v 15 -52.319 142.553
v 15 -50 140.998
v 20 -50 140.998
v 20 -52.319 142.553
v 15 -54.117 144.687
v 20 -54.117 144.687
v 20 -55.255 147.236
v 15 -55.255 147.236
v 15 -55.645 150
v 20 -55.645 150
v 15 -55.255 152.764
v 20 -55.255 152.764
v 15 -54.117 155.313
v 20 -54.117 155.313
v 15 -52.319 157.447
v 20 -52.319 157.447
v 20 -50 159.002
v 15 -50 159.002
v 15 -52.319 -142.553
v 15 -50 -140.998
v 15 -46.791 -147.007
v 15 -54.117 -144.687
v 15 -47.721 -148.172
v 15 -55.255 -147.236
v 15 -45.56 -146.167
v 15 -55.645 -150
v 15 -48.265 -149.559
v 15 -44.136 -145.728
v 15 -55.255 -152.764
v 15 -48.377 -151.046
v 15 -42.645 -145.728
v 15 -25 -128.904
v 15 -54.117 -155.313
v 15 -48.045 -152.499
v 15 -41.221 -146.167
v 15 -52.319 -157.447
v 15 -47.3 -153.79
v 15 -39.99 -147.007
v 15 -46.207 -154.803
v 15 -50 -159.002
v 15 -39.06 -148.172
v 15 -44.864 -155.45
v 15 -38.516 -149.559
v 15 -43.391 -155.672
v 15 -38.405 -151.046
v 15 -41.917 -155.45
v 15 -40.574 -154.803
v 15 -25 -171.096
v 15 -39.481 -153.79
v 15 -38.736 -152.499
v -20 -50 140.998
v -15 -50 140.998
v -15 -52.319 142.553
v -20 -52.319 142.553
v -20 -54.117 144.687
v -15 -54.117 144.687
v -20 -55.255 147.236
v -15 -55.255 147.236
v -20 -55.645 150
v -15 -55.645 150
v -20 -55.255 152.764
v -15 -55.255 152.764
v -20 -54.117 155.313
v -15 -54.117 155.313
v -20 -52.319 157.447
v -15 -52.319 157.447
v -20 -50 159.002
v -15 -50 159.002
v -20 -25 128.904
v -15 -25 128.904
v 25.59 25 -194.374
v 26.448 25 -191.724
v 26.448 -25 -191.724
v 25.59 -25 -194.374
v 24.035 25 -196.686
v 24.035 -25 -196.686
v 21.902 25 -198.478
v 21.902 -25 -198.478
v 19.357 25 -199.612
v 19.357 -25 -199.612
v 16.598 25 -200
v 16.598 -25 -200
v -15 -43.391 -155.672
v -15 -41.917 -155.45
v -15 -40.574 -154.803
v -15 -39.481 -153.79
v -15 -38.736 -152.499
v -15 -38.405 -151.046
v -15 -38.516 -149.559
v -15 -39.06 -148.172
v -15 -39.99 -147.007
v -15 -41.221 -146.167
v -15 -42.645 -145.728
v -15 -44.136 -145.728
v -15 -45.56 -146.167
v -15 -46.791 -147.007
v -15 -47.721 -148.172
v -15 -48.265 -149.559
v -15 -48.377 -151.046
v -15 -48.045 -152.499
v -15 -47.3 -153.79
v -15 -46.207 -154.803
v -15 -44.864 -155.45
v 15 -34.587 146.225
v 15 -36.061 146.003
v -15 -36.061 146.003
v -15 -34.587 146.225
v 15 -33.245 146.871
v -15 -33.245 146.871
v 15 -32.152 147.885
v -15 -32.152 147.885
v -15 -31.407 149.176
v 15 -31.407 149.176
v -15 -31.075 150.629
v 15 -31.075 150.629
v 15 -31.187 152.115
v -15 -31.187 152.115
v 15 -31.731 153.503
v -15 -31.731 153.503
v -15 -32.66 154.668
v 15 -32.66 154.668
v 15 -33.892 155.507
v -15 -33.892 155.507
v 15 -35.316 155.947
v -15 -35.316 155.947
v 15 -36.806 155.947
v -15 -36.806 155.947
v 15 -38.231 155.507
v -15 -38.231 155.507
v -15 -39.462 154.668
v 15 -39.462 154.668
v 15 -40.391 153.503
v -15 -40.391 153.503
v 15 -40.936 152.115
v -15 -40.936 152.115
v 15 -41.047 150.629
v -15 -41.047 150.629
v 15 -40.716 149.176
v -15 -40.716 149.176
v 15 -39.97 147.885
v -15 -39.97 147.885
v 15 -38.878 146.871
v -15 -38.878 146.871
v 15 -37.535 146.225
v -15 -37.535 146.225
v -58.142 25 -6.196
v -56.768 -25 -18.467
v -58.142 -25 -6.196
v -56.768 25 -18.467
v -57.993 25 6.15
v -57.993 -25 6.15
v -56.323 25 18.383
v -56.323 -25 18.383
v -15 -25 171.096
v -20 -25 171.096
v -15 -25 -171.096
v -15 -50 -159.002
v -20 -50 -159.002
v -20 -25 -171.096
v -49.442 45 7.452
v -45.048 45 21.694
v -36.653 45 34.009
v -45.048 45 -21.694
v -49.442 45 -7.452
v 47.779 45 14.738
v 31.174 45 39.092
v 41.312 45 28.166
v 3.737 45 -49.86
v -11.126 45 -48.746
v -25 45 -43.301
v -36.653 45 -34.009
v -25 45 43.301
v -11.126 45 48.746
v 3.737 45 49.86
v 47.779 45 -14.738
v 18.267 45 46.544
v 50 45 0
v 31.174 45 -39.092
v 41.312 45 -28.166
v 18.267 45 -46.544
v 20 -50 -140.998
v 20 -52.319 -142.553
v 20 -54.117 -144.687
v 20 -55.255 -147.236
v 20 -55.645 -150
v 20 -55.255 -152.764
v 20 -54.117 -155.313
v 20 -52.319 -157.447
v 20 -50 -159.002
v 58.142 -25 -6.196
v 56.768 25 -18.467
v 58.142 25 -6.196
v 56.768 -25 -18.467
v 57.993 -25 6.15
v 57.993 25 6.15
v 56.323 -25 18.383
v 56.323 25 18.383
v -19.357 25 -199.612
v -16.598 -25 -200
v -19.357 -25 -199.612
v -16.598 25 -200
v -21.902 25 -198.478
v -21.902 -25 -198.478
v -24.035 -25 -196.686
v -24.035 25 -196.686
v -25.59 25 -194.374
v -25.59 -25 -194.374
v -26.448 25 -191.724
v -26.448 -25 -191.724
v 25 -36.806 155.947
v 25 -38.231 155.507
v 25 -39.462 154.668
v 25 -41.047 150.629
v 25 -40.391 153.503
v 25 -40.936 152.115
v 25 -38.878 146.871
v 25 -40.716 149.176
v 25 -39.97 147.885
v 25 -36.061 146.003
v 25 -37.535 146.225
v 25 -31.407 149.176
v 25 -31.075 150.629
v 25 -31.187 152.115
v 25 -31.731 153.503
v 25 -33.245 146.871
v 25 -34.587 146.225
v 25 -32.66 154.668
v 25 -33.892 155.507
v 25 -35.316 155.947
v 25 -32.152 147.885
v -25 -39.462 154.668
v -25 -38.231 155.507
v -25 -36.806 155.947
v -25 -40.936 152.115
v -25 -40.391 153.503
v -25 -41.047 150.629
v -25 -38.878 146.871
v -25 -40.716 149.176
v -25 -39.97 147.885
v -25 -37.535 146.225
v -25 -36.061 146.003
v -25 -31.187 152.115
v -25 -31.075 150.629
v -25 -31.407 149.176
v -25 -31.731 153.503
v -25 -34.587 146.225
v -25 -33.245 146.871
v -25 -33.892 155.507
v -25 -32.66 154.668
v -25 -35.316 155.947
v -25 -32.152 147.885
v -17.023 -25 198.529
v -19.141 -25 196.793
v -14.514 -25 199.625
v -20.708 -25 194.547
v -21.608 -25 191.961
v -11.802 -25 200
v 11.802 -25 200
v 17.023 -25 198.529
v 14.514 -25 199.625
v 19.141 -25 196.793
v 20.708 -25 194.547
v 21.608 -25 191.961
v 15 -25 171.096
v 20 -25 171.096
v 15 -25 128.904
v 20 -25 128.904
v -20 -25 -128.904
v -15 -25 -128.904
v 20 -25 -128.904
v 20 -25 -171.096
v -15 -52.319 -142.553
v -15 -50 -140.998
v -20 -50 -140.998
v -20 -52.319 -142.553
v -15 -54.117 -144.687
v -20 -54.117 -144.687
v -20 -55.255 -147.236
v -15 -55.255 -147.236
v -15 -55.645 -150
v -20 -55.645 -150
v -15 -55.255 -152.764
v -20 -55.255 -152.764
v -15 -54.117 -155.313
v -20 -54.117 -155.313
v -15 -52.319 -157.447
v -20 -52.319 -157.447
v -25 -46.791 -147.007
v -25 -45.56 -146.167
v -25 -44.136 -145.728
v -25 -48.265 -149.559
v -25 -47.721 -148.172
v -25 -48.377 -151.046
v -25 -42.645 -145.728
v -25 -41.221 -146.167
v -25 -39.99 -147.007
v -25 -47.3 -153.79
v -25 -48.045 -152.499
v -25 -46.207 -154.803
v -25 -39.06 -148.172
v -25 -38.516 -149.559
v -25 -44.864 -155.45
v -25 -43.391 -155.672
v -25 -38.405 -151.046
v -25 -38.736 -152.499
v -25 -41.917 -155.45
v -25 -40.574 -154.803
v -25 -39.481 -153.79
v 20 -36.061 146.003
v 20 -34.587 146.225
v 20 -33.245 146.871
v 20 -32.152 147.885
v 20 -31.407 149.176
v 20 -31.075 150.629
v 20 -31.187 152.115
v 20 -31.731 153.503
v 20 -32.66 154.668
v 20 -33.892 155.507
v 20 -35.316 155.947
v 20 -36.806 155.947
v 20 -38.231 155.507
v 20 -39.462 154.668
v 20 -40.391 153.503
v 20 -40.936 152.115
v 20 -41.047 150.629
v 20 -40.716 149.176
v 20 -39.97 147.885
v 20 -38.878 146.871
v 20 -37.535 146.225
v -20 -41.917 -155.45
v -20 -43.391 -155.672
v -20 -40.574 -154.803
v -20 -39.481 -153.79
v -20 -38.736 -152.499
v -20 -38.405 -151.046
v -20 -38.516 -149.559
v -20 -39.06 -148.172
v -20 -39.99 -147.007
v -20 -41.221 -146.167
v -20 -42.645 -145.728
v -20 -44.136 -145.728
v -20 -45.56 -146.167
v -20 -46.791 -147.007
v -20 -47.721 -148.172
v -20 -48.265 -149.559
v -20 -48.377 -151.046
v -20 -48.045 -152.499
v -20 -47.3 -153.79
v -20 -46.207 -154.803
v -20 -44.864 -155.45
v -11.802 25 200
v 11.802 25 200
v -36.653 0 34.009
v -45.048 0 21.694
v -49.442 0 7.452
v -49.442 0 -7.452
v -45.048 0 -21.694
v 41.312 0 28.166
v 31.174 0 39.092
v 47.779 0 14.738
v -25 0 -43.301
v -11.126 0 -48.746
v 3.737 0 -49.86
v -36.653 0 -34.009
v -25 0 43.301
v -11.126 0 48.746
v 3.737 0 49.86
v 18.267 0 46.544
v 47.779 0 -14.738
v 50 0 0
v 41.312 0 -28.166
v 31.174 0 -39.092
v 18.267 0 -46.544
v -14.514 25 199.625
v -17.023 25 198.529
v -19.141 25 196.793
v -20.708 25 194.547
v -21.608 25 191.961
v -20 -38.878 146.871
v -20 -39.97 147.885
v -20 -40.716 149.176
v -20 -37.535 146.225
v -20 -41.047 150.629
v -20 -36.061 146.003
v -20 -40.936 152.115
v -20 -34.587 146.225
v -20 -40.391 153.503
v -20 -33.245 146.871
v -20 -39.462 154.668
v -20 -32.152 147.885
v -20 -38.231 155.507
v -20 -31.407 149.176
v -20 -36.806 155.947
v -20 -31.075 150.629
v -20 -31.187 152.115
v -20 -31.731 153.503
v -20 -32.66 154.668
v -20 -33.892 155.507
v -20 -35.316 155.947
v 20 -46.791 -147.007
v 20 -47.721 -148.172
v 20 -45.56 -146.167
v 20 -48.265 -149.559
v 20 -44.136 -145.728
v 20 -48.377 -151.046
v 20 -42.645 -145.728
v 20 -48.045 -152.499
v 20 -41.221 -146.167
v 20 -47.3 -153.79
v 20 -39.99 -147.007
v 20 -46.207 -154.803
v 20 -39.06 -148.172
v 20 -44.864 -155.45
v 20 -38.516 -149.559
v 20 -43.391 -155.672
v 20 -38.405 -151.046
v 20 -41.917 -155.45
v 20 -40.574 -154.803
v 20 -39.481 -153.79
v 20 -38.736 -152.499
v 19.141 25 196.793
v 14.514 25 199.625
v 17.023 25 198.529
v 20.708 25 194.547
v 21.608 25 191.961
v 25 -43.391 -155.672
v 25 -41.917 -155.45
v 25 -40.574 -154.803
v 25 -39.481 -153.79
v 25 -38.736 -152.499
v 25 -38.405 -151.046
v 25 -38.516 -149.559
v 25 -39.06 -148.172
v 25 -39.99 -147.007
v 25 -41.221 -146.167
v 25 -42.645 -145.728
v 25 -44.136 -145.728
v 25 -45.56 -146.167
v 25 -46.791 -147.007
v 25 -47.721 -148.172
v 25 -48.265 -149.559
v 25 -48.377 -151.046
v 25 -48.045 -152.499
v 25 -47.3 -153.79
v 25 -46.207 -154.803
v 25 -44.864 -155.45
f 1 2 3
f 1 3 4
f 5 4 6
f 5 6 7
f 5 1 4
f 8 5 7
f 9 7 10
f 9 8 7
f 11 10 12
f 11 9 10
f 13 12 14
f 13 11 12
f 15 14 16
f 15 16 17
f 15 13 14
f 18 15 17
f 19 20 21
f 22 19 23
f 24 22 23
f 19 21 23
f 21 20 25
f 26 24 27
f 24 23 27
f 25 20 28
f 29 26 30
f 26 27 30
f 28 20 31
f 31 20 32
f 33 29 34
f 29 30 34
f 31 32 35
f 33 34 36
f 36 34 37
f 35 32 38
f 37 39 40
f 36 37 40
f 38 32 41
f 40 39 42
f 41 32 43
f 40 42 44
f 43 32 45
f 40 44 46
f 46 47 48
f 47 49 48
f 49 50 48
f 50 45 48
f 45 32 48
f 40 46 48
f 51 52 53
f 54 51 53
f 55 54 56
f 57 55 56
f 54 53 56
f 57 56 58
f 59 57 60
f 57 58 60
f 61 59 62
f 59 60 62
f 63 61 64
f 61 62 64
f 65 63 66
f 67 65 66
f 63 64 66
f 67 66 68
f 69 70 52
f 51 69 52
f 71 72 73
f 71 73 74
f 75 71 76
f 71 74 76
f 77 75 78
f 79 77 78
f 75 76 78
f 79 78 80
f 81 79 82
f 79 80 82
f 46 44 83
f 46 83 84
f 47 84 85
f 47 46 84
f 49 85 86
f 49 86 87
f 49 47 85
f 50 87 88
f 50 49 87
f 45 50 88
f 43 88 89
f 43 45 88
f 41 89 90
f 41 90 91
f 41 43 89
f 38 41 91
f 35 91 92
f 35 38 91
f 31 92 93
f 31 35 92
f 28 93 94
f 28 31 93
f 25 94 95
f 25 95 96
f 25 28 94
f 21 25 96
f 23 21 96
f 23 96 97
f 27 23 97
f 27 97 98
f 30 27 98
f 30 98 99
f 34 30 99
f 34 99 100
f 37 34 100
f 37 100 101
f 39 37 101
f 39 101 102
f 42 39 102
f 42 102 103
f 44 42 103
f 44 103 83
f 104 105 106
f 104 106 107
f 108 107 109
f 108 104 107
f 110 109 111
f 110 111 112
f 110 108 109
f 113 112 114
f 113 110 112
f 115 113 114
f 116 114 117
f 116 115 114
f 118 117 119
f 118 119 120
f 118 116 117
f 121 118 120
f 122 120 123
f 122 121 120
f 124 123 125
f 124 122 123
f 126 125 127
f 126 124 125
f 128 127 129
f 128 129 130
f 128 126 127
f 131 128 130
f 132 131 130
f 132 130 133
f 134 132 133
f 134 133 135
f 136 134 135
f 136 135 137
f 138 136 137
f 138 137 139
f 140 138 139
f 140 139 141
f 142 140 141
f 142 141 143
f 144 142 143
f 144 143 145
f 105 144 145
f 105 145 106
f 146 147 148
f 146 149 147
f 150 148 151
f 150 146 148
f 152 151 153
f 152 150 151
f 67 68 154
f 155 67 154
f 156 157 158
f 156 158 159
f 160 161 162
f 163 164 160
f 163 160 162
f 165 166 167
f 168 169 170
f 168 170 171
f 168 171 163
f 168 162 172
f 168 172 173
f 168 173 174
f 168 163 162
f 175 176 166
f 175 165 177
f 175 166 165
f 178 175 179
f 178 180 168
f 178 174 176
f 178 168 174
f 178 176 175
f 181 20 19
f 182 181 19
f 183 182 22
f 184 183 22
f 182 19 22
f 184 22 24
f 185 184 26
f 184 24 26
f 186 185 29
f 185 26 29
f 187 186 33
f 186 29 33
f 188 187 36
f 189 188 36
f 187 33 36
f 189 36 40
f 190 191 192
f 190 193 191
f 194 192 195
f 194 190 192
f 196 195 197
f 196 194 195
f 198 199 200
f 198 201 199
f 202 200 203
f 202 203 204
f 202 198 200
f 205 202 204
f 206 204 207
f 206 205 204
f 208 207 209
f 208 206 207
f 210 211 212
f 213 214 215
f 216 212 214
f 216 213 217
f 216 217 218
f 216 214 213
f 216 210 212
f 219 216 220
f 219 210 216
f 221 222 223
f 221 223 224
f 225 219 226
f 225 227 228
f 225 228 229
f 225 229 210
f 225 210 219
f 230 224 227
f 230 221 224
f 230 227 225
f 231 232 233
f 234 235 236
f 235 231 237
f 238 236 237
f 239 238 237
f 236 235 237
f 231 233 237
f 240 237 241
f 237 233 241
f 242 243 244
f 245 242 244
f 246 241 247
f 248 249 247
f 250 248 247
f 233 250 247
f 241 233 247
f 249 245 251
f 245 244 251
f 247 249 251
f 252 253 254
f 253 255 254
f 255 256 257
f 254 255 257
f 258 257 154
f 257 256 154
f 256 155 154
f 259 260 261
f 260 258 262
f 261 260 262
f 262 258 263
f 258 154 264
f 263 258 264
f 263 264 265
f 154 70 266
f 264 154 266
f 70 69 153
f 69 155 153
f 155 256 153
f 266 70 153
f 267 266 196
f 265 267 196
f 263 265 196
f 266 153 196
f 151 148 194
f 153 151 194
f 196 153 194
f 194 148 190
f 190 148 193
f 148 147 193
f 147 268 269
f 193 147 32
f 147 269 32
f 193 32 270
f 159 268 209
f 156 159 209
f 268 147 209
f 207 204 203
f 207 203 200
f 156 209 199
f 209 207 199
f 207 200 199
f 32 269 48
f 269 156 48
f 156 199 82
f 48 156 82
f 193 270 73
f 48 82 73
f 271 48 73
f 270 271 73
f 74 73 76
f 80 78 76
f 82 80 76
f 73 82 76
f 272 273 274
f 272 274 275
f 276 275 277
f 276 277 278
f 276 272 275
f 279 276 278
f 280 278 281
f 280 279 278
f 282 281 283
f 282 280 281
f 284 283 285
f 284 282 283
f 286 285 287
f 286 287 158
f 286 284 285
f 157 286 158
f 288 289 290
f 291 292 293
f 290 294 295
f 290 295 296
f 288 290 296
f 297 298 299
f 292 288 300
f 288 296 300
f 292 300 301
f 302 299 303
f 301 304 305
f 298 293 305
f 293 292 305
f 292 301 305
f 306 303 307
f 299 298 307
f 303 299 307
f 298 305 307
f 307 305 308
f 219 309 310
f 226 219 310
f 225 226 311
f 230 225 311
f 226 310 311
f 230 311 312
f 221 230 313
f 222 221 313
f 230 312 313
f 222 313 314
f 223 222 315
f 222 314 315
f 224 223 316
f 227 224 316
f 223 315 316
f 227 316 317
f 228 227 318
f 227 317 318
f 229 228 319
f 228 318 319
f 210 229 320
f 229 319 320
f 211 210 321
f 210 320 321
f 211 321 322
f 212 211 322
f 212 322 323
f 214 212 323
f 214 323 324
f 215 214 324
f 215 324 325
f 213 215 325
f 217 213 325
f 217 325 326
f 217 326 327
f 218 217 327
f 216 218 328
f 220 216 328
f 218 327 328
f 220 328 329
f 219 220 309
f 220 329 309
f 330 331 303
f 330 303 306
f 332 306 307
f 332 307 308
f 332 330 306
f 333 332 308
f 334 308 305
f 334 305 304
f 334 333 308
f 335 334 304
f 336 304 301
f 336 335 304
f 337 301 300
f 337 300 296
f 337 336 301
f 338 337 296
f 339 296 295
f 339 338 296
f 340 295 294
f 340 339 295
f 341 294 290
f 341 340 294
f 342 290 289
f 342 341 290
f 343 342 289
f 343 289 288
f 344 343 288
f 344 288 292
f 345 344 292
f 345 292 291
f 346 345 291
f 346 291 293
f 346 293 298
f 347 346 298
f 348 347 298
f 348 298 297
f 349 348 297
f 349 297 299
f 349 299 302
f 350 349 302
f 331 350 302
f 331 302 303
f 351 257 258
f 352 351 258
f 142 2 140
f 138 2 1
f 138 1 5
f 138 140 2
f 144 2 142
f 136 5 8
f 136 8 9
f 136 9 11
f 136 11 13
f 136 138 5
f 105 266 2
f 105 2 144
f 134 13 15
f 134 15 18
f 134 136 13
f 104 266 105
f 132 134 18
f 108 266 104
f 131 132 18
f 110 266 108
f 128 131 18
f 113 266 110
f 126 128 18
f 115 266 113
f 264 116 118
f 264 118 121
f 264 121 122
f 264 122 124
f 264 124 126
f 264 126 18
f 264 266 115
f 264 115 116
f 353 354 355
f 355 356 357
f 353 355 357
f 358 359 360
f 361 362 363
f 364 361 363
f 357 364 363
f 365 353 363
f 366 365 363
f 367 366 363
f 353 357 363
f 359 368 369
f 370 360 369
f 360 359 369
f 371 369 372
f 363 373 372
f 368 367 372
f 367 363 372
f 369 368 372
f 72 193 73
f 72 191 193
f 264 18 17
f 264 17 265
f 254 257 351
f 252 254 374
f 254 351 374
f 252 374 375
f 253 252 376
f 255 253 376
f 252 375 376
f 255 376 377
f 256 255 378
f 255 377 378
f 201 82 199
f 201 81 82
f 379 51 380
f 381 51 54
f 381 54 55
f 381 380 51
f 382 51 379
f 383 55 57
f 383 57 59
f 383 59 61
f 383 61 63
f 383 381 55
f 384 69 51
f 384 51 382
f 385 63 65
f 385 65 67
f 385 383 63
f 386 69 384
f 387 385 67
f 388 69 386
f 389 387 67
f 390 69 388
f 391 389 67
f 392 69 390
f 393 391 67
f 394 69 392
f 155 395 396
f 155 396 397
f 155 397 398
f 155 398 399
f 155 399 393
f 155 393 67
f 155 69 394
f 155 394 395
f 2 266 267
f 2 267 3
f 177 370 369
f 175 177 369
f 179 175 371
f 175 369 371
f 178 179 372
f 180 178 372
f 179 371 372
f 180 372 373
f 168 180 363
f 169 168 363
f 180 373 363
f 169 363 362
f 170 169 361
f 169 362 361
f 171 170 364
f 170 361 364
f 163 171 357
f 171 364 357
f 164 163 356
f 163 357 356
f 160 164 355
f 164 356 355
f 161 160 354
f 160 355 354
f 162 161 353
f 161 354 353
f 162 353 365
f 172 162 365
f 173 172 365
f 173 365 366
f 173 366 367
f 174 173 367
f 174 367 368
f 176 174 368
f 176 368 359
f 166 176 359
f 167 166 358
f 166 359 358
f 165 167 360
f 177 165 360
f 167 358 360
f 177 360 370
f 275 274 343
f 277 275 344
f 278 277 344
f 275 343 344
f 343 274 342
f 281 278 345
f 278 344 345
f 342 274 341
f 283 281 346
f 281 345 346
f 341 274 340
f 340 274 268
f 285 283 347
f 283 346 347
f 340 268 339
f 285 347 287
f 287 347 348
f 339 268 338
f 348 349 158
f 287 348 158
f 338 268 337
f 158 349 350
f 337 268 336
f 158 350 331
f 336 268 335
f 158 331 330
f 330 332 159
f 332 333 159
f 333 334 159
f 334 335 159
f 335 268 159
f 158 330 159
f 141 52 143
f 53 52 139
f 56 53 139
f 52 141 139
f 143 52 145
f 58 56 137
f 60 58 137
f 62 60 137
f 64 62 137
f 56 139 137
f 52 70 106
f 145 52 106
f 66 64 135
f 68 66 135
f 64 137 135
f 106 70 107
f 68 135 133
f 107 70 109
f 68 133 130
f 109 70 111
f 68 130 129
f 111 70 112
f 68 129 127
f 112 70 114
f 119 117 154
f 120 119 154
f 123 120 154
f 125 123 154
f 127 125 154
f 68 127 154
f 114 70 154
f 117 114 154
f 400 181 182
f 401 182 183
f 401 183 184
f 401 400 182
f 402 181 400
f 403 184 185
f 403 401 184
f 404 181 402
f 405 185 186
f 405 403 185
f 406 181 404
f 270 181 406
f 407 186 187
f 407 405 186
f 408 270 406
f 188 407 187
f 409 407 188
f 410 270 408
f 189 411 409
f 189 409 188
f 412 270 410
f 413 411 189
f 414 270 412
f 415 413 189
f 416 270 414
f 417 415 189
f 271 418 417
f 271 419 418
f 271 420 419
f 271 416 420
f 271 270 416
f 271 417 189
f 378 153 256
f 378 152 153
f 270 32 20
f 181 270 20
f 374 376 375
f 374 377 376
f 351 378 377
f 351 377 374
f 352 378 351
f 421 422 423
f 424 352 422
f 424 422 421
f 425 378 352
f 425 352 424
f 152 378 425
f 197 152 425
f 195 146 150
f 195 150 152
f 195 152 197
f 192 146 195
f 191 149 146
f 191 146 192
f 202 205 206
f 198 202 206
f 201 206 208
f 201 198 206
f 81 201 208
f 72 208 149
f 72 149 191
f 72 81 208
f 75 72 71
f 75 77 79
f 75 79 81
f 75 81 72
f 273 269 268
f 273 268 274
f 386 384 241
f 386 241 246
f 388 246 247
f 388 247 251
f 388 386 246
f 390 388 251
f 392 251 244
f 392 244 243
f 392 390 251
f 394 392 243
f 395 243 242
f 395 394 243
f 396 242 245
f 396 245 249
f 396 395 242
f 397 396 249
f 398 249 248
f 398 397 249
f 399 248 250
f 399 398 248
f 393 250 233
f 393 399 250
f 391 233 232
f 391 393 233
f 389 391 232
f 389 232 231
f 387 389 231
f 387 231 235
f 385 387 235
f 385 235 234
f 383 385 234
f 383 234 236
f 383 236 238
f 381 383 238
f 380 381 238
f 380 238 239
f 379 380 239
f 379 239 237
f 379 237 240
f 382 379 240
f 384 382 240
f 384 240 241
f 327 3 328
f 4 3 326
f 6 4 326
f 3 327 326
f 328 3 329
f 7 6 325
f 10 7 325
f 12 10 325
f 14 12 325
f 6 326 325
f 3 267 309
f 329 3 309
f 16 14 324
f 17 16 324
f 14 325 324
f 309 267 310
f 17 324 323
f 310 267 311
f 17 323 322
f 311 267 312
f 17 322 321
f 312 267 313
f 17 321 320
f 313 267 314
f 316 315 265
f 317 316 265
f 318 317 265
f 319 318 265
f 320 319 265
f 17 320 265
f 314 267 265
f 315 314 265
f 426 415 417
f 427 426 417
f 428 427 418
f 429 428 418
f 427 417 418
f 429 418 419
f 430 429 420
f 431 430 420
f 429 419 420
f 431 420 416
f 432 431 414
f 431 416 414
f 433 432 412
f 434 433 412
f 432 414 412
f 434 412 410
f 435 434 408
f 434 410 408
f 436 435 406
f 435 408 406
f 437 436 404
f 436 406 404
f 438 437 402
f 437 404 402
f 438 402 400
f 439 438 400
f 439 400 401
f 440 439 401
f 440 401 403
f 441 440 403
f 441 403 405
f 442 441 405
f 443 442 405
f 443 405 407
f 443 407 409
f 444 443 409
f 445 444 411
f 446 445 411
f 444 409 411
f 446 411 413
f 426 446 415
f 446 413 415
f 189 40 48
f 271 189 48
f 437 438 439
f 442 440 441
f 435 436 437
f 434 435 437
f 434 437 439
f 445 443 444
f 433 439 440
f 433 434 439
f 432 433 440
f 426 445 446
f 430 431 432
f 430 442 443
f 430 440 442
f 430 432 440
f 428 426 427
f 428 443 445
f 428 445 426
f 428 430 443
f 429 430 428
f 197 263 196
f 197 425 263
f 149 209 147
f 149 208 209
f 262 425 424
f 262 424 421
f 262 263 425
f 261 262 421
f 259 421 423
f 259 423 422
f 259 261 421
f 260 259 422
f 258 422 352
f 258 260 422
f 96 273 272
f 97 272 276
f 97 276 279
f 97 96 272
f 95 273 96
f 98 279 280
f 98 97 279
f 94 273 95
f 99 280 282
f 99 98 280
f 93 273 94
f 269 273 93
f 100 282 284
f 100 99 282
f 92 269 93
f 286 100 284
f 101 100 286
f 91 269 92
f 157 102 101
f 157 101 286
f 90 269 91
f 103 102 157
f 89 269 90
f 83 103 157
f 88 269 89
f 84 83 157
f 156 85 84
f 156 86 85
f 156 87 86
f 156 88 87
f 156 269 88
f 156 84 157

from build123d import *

# Parameters (mm, degrees)
BOSS_EXTRUDE1_DEPTH      = 25
BOSS_EXTRUDE1_DEPTH_BACK = 25
SKETCH3_R                = 50
BOSS_EXTRUDE2_DEPTH      = 45
BOSS_EXTRUDE3_DEPTH      = 5
FILLET1_R                = 100
FILLET3_R                = 10
BOSS_EXTRUDE4_DEPTH      = 5
BOSS_EXTRUDE4_DEPTH_BACK = 45
SKETCH7_R                = 5
BOSS_EXTRUDE5_DEPTH      = 5
BOSS_EXTRUDE5_DEPTH_BACK = 45
SKETCH8_R                = 5


with BuildPart() as part:
    # Sketch2 → Boss-Extrude1 (new, two sides: drawn at the far end of the back side and taken through both)
    with BuildSketch(Plane(origin=(0, 0, 0), x_dir=(1, 0, 0), z_dir=(0, 1, 0)).offset(-BOSS_EXTRUDE1_DEPTH_BACK)):
        Polygon((25, 200), (-25, 200), (-60, 0), (-20, -200), (20, -200), (60, 0), align=None)
    extrude(amount=BOSS_EXTRUDE1_DEPTH + BOSS_EXTRUDE1_DEPTH_BACK)

    # Sketch6 → Boss-Extrude3 (add)
    with BuildSketch(Plane(origin=(15, 0, 0), x_dir=(0, 0, -1), z_dir=(1, 0, 0))):
        with BuildLine():
            Line((128.903651647, -25), (140.998075731, -50))
            ThreePointArc((140.998075731, -50), (150, -55.645076413), (159.001924269, -50))
            Line((159.001924269, -50), (171.096348353, -25))
            Line((171.096348353, -25), (128.903651647, -25))
        make_face()
        with BuildLine():
            Line((-128.903651647, -25), (-140.998075731, -50))
            ThreePointArc((-140.998075731, -50), (-150, -55.645076413), (-159.001924269, -50))
            Line((-159.001924269, -50), (-171.096348353, -25))
            Line((-171.096348353, -25), (-128.903651647, -25))
        make_face()
    boss_extrude3 = extrude(amount=BOSS_EXTRUDE3_DEPTH)

    # Mirror2: Boss-Extrude3 across plane
    add(boss_extrude3.mirror(Plane(origin=(0, 0, 0), x_dir=(0, 0, 1), z_dir=(1, 0, 0))))

    # Fillet1
    fillet1_edges = [part.edges().sort_by_distance(p)[0] for p in [
        (60, 0, 0),
        (-60, 0, 0),
    ]]
    fillet(fillet1_edges, radius=FILLET1_R)

    # Fillet3
    fillet3_edges = [part.edges().sort_by_distance(p)[0] for p in [
        (20, 0, 200),
        (-20, 0, 200),
        (25, 0, -200),
        (-25, 0, -200),
    ]]
    fillet(fillet3_edges, radius=FILLET3_R)

    # Sketch7 → Boss-Extrude4 (add, two sides: drawn at the far end of the back side and taken through both)
    with BuildSketch(Plane(origin=(20, 0, 0), x_dir=(0, 0, -1), z_dir=(1, 0, 0)).offset(-BOSS_EXTRUDE4_DEPTH_BACK)):
        with Locations((-151.00257991, -36.061231276)):
            Circle(SKETCH7_R)
    extrude(amount=BOSS_EXTRUDE4_DEPTH + BOSS_EXTRUDE4_DEPTH_BACK)

    # Sketch8 → Boss-Extrude5 (add, two sides: drawn at the far end of the back side and taken through both)
    with BuildSketch(Plane(origin=(20, 0, 0), x_dir=(0, 0, -1), z_dir=(1, 0, 0)).offset(-BOSS_EXTRUDE5_DEPTH_BACK)):
        with Locations((150.672063463, -43.390539475)):
            Circle(SKETCH8_R)
    extrude(amount=BOSS_EXTRUDE5_DEPTH + BOSS_EXTRUDE5_DEPTH_BACK)


with BuildPart() as body_2:
    # Sketch3 → Boss-Extrude2 (new body)
    with BuildSketch(Plane(origin=(0, 0, 0), x_dir=(1, 0, 0), z_dir=(0, 1, 0))):
        Circle(SKETCH3_R)
    extrude(amount=BOSS_EXTRUDE2_DEPTH)


solid = Compound([part.part, body_2.part])
